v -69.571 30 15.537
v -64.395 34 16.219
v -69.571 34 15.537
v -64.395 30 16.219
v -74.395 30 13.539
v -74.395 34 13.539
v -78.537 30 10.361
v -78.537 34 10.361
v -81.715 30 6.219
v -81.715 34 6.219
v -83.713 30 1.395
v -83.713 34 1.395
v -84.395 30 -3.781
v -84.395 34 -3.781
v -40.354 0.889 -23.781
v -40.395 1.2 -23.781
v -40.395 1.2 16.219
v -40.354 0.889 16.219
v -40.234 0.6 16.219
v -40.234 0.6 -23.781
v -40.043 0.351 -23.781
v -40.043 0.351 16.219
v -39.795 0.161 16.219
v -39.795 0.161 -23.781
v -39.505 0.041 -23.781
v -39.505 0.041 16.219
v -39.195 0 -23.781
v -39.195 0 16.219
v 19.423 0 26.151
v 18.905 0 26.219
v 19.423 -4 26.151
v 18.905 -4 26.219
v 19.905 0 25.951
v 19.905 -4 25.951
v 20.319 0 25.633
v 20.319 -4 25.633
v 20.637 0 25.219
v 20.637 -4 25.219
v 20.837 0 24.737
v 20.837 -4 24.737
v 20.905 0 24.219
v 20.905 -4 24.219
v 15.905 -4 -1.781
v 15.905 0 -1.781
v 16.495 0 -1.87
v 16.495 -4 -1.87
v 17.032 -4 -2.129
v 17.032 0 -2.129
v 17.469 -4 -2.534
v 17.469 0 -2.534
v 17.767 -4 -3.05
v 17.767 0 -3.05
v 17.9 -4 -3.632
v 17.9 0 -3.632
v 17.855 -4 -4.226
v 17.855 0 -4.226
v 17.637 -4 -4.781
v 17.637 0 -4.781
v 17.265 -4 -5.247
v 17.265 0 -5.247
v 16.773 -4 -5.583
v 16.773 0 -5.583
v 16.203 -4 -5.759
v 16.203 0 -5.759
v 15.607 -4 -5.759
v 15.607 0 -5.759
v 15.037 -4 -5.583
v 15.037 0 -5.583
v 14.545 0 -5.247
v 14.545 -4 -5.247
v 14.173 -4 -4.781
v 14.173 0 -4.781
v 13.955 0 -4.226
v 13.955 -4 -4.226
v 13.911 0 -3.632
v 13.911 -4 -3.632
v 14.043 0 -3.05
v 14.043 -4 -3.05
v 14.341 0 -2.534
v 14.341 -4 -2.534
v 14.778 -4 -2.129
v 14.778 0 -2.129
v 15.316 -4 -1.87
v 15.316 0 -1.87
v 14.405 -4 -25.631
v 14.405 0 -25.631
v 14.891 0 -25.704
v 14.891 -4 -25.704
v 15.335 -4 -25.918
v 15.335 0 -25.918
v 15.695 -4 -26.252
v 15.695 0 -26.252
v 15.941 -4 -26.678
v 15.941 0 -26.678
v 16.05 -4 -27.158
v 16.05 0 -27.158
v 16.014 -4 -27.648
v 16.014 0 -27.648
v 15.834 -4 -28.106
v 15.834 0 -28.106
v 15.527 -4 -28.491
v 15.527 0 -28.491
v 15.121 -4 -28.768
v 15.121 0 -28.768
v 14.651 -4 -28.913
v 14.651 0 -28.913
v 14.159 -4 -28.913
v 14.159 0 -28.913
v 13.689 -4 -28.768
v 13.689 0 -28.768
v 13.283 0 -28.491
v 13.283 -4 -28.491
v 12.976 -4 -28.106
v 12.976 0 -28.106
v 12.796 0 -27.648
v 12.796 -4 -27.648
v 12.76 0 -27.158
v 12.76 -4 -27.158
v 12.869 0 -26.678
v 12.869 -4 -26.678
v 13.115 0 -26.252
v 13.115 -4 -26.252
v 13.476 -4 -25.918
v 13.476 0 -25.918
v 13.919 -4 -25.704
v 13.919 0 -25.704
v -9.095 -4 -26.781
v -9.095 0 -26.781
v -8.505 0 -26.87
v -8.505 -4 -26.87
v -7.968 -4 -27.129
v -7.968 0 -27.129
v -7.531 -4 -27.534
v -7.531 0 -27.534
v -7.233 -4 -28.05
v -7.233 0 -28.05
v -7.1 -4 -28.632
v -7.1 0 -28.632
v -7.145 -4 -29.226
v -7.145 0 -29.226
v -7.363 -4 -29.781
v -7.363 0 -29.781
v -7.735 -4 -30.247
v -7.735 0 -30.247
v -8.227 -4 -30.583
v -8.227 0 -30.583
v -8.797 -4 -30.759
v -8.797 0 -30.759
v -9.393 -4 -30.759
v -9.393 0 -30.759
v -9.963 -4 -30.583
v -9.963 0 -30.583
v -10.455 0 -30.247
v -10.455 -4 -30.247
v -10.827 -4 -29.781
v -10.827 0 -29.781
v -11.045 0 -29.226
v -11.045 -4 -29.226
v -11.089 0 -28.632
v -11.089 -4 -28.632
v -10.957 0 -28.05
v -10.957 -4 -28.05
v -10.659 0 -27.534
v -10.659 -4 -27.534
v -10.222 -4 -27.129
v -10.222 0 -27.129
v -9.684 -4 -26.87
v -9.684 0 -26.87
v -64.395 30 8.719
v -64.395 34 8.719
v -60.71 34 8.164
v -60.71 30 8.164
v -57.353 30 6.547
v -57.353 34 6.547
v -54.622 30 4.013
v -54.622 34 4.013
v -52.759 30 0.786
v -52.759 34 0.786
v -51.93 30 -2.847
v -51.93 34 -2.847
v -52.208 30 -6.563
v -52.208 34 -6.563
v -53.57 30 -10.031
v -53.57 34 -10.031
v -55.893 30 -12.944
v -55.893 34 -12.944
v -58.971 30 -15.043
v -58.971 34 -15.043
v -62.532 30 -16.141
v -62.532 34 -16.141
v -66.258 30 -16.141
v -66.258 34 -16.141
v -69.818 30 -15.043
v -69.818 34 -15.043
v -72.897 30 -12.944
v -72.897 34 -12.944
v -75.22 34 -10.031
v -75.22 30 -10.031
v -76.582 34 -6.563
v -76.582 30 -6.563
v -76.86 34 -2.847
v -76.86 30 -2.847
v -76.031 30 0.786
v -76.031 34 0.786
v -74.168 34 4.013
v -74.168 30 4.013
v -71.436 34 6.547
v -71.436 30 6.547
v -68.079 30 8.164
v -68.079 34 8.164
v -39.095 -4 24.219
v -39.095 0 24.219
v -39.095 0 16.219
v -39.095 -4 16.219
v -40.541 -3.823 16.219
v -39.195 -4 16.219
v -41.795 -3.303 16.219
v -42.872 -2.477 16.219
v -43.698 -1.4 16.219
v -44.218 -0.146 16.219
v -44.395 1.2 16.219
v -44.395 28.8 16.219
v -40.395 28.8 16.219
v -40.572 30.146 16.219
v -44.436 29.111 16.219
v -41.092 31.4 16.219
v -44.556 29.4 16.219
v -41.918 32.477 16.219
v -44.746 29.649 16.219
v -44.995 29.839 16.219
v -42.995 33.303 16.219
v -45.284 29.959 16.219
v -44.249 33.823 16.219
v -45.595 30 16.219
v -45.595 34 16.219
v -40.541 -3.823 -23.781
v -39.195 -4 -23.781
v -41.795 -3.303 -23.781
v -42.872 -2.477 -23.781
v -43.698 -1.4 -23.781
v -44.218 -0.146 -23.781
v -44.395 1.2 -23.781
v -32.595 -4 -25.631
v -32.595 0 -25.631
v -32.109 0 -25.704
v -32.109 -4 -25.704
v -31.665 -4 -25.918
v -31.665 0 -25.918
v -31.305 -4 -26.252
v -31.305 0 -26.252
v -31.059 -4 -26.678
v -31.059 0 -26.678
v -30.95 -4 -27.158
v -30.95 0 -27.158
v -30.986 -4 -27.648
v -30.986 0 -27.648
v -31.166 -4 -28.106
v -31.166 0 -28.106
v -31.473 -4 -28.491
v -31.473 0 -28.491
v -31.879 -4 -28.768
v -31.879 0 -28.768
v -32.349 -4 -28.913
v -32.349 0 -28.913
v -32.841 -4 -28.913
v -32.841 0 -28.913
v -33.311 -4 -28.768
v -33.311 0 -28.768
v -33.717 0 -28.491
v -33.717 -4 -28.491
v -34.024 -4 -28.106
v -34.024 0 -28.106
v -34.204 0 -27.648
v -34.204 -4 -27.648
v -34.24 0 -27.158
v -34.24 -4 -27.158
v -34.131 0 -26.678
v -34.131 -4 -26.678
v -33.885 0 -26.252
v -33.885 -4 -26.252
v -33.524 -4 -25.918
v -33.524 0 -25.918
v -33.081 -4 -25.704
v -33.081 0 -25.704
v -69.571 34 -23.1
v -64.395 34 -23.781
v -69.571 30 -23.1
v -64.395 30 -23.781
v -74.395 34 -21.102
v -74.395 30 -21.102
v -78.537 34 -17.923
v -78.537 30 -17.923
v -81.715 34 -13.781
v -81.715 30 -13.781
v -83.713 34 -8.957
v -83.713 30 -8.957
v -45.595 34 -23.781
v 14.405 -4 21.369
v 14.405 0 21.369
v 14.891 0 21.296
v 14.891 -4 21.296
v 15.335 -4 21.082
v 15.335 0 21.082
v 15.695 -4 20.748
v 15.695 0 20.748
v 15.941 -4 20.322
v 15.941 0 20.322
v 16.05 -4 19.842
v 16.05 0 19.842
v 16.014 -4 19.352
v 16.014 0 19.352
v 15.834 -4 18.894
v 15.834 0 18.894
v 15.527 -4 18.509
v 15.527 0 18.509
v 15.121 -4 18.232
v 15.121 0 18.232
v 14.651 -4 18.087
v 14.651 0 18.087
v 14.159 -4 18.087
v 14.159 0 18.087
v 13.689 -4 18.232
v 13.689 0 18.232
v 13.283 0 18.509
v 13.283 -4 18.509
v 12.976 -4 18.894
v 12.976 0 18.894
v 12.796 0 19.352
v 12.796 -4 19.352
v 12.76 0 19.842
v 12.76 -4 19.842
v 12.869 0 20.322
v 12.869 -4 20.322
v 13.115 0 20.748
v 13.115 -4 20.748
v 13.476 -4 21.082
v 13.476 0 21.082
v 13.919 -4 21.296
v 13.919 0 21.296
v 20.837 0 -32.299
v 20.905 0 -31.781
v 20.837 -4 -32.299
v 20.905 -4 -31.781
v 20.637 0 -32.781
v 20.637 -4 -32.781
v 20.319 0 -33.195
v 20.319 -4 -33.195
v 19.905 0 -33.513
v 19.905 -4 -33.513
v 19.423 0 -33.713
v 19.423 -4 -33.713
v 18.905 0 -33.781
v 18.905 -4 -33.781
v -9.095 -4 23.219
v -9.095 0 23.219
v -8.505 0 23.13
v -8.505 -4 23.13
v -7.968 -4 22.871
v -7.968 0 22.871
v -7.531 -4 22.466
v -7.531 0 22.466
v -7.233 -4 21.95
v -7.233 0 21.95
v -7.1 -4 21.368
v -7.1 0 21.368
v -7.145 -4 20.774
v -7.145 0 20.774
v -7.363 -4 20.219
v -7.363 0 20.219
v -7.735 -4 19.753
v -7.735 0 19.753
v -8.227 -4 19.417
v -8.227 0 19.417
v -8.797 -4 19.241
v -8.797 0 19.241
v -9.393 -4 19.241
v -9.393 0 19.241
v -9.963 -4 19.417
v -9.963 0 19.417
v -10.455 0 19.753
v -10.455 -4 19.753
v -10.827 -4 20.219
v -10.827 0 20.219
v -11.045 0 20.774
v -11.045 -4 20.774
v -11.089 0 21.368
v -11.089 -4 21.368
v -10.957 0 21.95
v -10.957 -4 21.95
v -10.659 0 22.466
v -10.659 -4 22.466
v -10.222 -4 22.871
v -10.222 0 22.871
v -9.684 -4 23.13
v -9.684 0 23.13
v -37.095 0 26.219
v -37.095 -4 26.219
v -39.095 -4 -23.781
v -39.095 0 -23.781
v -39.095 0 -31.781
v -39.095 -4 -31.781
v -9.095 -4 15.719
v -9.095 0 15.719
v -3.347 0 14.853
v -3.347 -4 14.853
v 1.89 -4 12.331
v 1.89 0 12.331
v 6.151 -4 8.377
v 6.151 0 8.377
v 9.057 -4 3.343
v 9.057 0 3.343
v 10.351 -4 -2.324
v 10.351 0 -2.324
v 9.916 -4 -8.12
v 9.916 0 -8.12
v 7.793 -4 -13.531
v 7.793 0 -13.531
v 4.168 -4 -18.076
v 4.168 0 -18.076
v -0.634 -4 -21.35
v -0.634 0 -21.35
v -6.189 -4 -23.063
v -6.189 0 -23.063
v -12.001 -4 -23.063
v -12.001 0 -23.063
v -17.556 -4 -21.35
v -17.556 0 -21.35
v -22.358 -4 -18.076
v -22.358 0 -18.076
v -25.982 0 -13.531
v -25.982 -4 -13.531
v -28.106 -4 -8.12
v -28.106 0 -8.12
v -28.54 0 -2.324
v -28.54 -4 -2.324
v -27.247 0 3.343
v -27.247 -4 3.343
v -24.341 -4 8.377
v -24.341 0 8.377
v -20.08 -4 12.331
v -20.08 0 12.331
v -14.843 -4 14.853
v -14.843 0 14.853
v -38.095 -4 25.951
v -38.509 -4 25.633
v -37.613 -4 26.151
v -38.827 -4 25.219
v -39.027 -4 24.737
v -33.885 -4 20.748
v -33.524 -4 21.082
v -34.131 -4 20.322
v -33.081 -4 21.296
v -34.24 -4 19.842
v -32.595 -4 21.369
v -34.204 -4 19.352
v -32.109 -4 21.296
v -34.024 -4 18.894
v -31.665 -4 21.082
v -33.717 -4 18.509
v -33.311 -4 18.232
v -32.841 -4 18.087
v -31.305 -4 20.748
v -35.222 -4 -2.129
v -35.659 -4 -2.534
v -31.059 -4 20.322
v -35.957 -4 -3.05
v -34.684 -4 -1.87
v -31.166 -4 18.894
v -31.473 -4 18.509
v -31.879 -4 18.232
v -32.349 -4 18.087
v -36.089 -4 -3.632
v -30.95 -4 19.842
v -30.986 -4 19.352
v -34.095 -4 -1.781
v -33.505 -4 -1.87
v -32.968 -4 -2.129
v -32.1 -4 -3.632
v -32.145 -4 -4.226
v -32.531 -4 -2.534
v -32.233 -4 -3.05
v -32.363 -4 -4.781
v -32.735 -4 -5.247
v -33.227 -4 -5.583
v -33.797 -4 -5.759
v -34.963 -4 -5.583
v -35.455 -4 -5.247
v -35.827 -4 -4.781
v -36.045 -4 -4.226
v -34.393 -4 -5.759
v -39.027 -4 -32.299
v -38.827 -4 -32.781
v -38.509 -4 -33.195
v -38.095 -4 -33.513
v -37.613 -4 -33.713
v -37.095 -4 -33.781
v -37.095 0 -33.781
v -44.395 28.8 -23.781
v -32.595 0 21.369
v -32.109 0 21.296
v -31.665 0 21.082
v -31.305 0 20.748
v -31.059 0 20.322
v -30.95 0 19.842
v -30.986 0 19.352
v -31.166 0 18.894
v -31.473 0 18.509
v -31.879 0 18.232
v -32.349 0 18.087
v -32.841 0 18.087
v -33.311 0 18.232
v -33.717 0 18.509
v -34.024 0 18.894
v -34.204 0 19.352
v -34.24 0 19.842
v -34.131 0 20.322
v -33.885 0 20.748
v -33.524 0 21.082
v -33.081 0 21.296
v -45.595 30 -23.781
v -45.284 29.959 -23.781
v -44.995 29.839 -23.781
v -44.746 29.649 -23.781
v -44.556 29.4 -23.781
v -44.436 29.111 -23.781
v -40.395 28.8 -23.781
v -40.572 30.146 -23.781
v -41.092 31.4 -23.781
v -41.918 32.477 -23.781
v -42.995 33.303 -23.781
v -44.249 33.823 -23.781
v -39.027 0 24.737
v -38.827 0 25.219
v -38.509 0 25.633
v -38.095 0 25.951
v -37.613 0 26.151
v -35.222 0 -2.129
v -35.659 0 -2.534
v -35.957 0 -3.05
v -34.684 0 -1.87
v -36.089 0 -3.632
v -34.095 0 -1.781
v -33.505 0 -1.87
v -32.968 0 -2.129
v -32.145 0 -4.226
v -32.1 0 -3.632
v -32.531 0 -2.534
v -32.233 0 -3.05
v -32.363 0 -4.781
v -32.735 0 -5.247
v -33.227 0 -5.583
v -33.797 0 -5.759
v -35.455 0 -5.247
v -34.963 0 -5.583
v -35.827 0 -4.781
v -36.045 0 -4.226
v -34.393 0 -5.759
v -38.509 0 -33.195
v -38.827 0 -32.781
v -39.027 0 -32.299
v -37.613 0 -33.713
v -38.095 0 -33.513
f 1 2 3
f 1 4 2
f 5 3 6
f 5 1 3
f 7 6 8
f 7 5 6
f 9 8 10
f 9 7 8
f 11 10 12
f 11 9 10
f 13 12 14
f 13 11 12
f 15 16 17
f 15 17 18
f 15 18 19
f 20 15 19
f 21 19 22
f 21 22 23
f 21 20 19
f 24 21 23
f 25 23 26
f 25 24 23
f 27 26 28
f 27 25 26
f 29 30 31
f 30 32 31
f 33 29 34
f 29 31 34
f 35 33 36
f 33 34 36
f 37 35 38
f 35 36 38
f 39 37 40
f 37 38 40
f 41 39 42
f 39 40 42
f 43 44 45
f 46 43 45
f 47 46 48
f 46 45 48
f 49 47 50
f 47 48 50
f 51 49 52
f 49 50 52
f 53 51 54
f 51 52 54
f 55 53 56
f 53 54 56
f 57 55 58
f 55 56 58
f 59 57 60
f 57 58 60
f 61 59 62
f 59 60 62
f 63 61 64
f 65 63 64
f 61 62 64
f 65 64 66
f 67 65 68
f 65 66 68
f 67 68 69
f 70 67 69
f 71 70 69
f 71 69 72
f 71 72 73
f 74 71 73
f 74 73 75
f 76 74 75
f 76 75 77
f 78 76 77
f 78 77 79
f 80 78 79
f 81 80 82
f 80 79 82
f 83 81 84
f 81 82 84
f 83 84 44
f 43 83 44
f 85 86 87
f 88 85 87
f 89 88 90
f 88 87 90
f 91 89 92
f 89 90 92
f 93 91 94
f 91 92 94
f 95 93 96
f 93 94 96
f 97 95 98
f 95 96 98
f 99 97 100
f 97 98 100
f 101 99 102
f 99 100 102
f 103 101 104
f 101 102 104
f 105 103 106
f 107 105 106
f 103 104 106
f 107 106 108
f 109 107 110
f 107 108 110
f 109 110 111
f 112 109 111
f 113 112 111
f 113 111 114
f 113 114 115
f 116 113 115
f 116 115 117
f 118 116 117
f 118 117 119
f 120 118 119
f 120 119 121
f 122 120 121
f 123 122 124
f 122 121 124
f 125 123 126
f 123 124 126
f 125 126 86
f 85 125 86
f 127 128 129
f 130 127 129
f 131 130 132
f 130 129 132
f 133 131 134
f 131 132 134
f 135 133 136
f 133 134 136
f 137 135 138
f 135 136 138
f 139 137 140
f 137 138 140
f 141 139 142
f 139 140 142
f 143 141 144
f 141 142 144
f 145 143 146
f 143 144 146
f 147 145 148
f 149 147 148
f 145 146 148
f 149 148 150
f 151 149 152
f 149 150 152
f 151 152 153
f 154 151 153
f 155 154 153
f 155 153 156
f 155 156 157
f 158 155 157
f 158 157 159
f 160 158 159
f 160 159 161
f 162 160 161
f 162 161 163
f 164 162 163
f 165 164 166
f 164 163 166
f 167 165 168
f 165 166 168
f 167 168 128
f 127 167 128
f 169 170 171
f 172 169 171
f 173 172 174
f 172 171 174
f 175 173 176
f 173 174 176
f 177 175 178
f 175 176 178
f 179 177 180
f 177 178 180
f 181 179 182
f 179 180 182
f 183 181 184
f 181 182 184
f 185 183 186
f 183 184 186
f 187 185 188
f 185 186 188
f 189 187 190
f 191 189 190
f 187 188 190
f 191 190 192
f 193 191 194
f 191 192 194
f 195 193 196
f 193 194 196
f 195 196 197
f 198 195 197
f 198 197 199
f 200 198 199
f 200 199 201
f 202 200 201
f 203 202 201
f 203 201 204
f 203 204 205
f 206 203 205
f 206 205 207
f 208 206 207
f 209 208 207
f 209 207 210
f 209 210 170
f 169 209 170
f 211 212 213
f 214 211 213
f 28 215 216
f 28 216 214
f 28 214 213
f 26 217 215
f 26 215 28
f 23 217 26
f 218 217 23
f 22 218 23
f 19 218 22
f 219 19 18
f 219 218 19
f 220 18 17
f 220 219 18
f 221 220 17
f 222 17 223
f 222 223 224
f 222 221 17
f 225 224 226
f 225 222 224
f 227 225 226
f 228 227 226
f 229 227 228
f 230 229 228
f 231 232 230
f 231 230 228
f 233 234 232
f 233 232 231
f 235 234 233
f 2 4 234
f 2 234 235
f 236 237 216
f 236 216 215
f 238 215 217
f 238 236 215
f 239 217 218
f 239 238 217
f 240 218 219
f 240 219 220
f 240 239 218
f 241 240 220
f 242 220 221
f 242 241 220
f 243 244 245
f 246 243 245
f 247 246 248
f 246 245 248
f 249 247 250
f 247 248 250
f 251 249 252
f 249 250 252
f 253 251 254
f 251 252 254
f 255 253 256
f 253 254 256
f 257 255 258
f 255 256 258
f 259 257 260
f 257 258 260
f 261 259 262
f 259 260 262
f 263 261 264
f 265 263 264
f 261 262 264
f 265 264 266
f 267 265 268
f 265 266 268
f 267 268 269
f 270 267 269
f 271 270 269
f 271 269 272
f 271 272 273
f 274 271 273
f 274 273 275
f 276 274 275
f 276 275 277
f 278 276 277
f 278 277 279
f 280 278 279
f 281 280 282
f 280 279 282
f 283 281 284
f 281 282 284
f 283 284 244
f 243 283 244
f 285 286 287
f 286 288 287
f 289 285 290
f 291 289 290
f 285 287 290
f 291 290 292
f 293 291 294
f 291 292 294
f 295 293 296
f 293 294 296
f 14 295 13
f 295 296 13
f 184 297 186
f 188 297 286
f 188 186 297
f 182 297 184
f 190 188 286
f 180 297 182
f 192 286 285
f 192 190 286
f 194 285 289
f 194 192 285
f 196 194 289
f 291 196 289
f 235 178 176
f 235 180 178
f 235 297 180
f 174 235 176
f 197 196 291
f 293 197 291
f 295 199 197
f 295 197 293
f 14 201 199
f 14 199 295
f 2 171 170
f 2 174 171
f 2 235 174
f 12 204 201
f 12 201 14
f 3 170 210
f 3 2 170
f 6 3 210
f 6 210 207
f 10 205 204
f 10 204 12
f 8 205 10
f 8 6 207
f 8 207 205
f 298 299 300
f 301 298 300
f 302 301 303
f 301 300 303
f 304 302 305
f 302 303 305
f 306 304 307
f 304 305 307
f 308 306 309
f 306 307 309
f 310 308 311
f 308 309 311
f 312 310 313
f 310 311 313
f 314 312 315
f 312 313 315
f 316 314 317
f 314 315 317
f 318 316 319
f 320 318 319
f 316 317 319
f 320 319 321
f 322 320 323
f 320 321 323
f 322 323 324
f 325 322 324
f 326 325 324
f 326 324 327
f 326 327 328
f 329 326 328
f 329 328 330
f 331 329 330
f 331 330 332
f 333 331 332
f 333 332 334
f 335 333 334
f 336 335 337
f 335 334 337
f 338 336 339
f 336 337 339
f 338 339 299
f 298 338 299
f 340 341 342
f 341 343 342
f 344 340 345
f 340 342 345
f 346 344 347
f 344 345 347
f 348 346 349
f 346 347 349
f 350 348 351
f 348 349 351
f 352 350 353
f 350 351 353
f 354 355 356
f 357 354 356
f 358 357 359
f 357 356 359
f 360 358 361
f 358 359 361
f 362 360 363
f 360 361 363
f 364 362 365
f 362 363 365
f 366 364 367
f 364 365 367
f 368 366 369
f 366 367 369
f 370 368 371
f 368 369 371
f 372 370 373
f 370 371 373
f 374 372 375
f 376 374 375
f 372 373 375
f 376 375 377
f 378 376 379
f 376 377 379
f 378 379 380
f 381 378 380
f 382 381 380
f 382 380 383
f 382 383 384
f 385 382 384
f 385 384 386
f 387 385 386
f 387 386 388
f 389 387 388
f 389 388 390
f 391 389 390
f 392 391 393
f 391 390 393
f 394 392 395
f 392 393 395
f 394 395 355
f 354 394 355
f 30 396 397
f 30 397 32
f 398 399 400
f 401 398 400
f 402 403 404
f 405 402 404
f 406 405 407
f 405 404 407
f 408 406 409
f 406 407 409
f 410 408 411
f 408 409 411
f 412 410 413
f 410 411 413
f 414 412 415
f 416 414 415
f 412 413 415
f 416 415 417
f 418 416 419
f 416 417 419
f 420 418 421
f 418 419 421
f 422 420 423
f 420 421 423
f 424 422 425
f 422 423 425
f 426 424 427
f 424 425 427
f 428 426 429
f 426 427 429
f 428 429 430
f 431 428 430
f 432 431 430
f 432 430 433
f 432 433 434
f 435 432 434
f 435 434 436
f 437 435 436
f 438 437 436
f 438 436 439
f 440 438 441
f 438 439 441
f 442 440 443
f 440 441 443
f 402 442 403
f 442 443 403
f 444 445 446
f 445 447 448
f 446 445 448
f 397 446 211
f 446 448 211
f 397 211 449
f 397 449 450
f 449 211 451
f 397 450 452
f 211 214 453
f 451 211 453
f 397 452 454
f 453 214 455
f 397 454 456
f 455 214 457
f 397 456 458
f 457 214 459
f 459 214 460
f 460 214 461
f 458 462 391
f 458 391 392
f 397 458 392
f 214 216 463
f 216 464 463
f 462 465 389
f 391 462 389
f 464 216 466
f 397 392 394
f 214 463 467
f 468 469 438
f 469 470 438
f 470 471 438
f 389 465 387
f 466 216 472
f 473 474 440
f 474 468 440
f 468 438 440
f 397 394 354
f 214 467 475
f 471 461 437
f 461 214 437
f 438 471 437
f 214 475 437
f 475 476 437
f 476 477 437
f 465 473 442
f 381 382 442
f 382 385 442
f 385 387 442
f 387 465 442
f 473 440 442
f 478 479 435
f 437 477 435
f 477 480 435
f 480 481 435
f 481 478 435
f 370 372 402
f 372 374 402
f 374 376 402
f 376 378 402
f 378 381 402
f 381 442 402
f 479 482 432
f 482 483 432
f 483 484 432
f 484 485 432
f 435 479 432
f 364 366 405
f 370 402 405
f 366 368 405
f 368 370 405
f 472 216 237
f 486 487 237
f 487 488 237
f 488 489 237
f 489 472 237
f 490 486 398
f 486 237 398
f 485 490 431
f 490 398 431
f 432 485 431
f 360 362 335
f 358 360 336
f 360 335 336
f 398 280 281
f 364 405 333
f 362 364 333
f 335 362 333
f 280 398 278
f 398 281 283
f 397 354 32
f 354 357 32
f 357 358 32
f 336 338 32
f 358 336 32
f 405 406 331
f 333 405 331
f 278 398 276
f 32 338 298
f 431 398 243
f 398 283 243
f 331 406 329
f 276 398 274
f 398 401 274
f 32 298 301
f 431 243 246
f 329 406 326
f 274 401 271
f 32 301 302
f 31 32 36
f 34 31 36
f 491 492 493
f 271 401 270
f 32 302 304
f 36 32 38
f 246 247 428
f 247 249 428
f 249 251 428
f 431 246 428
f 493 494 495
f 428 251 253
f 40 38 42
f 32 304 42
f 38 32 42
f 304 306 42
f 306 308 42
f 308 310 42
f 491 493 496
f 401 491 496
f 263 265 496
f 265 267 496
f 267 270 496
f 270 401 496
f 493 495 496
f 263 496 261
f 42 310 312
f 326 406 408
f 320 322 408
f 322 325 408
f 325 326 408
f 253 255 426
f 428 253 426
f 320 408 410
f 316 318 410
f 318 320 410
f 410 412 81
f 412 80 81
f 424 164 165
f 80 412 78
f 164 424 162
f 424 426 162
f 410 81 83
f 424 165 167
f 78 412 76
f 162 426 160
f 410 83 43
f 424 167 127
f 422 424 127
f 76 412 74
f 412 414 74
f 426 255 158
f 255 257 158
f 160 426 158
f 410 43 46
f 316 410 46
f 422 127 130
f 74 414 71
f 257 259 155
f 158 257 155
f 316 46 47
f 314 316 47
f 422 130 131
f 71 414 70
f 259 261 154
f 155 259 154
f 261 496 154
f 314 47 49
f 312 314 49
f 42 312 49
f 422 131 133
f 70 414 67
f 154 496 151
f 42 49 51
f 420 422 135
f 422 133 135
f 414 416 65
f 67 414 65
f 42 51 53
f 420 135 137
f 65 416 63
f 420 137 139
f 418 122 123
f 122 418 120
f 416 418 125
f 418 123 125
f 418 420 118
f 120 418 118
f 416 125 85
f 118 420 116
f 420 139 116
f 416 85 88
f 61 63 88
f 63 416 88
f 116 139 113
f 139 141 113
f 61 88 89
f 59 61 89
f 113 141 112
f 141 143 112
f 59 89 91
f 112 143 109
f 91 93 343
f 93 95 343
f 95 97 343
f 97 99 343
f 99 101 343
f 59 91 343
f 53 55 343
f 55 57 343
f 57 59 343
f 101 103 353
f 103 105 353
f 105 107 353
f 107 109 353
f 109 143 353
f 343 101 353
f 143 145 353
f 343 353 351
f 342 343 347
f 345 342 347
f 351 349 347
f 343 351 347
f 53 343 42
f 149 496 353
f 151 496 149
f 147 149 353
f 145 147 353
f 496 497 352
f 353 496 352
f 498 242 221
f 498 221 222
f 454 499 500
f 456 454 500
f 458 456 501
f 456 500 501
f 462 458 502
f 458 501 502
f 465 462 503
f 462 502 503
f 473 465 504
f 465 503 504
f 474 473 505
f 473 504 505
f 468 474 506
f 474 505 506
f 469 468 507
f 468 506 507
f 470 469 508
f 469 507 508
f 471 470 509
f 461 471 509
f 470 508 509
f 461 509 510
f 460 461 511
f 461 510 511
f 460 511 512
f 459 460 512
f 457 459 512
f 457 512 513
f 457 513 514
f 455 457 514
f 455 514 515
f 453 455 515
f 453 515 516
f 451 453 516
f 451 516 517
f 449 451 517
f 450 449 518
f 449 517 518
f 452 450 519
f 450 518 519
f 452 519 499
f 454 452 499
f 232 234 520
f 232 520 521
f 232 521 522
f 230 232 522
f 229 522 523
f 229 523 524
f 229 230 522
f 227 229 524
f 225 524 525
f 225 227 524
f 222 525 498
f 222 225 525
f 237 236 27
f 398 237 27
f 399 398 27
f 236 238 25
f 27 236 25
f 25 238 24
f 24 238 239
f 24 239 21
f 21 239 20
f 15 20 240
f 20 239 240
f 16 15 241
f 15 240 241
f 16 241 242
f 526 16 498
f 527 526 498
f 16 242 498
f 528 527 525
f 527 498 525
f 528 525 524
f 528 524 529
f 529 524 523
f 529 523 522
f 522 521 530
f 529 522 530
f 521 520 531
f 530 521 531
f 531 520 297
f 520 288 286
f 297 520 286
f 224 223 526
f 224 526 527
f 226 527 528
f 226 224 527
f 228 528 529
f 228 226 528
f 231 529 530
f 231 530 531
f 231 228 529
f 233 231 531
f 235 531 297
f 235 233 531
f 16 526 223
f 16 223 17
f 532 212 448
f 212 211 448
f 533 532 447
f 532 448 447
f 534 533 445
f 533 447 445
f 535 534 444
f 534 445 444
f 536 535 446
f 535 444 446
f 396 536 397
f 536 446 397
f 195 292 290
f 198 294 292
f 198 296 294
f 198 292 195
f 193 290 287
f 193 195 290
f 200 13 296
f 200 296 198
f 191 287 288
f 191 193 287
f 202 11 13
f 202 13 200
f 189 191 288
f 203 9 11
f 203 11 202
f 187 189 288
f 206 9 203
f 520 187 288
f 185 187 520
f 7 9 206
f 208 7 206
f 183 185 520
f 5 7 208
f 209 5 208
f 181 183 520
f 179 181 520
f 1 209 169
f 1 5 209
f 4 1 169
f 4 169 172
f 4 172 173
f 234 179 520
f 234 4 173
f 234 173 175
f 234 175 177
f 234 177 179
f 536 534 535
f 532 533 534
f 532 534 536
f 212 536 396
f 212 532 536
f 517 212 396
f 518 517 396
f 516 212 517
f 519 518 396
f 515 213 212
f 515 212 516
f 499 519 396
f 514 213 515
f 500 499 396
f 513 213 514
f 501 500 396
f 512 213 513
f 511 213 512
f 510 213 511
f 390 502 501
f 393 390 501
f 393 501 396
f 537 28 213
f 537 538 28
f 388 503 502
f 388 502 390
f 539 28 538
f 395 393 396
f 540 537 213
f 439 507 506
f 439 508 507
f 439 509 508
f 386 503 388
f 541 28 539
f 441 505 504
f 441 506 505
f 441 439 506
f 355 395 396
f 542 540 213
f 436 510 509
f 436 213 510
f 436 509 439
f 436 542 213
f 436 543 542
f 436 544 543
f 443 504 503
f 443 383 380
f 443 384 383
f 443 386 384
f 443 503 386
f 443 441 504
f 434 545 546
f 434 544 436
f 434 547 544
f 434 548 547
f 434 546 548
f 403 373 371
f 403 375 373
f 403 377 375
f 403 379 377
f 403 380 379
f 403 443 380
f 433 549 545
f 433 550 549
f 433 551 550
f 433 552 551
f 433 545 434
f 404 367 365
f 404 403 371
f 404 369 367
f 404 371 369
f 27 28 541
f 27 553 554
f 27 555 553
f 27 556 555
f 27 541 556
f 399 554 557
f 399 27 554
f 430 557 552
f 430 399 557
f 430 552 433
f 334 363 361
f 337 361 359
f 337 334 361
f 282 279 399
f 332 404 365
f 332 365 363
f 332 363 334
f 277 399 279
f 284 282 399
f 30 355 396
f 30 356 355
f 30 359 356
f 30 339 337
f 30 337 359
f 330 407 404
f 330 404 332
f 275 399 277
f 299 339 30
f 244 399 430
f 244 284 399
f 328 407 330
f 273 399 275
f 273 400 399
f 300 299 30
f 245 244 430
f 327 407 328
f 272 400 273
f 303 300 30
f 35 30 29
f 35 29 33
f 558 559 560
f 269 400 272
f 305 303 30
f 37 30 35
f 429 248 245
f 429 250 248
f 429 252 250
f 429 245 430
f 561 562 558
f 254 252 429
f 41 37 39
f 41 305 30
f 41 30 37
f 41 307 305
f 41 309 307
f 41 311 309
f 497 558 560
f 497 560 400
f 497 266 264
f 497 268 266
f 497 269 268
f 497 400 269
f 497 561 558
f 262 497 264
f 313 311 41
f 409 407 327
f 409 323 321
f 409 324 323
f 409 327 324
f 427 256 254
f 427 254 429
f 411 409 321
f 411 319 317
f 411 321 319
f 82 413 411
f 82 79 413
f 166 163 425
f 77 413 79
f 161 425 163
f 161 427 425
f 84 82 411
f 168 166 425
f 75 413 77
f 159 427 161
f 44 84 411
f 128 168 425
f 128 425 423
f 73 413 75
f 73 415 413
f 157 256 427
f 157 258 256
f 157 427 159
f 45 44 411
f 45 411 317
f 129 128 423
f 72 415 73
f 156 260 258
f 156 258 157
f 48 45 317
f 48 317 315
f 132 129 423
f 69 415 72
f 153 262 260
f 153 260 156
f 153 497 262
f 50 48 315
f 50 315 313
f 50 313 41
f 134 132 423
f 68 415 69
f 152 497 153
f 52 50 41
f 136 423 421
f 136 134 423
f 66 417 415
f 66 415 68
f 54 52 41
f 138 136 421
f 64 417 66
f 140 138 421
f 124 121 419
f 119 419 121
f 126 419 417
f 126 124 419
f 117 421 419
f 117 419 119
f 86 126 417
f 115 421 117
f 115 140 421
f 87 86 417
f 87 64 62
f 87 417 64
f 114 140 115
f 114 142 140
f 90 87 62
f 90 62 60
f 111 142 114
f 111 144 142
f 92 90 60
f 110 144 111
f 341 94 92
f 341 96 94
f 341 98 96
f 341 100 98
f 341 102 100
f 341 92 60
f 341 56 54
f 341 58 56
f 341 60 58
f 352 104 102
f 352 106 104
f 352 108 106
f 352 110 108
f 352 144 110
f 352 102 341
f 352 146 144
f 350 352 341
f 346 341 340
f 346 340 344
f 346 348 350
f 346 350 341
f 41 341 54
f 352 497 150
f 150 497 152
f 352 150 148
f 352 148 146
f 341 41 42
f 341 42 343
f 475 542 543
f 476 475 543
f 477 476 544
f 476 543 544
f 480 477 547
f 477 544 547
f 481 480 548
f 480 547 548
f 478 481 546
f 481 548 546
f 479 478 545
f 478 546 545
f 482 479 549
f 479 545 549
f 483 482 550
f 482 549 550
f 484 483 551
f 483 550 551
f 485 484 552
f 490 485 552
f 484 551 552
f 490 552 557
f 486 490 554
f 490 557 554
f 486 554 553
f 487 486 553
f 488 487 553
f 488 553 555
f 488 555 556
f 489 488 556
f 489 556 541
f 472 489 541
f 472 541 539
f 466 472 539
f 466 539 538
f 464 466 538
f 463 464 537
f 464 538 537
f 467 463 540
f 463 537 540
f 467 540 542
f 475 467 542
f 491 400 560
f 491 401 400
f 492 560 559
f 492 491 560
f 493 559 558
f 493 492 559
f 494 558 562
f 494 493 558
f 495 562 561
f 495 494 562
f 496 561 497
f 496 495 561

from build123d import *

# Parameters (mm, degrees)
SKETCH_1_W                       = 60
SKETCH_1_H                       = 60
SKETCH_1_R                       = 1.65
SKETCH_1_R_2                     = 19.5
SKETCH_1_R_3                     = 2
SM_BASE_FLANGE_1_DEPTH           = 4
SKETCH_4_W                       = 40
SKETCH_4_H                       = 4
EXTRUDE_1_DEPTH                  = 0.1
SM_EDGE_FLANGE_1_DEPTH           = 40
SM_EDGE_FLANGE_2_STRIP_W         = 18.4
SM_EDGE_FLANGE_2_STRIP_H         = 4
SM_EDGE_FLANGE_2_STRIP_CUT_DEPTH = 40
SM_EDGE_FLANGE_2_DEPTH           = 40
FILLET_1_R                       = 2
SKETCH_11_R                      = 12.5
CUT_EXTRUDE_1_DEPTH              = 10
FILLET_2_R                       = 20


# Sheet-metal steps are written as plain solids
with BuildPart() as part:
    # Sketch 1 → Базовая кромка1 (new body)
    with BuildSketch(Plane(origin=(0, 0, 0), x_dir=(1, 0, 0), z_dir=(0, 1, 0))):
        with Locations((-9.094903125, 3.781032797)):
            Rectangle(SKETCH_1_W, SKETCH_1_H)
        with Locations(Location((-32.594903125, 27.281032797, 0), (0, 0, 270))):
            Circle(SKETCH_1_R, mode=Mode.SUBTRACT)
        with Locations(Location((14.405096875, 27.281032797, 0), (0, 0, 270))):
            Circle(SKETCH_1_R, mode=Mode.SUBTRACT)
        with Locations(Location((-32.594903125, -19.718967203, 0), (0, 0, 270))):
            Circle(SKETCH_1_R, mode=Mode.SUBTRACT)
        with Locations(Location((14.405096875, -19.718967203, 0), (0, 0, 270))):
            Circle(SKETCH_1_R, mode=Mode.SUBTRACT)
        with Locations(Location((-9.094903125, 3.781032797, 0), (0, 0, 270))):
            Circle(SKETCH_1_R_2, mode=Mode.SUBTRACT)
        with Locations(Location((-34.094903125, 3.781032797, 0), (0, 0, 270))):
            Circle(SKETCH_1_R_3, mode=Mode.SUBTRACT)
        with Locations(Location((15.905096875, 3.781032797, 0), (0, 0, 270))):
            Circle(SKETCH_1_R_3, mode=Mode.SUBTRACT)
        with Locations(Location((-9.094903125, 28.781032797, 0), (0, 0, 270))):
            Circle(SKETCH_1_R_3, mode=Mode.SUBTRACT)
        with Locations(Location((-9.094903125, -21.218967203, 0), (0, 0, 270))):
            Circle(SKETCH_1_R_3, mode=Mode.SUBTRACT)
    extrude(amount=-SM_BASE_FLANGE_1_DEPTH)

    # Эскиз4 → Бобышка-Вытянуть1 (add)
    with BuildSketch(Plane.ZY.offset(39.094903125)):
        with Locations((-3.781032797, -2)):
            Rectangle(SKETCH_4_W, SKETCH_4_H)
    extrude(amount=EXTRUDE_1_DEPTH)

    # Ребро-кромка1 section (across the edge) → Ребро-кромка1 (add)
    with BuildSketch(Plane(origin=(-40.394903125, 0, -23.781032797), x_dir=(1, 0, 0), z_dir=(0, 0, 1))):
        with BuildLine():
            Line((-4, 1.2), (-4, 30))
            Line((-4, 30), (0, 30))
            Line((0, 30), (0, 1.2))
            ThreePointArc((0, 1.2), (0.351471863, 0.351471863), (1.2, 0))
            Line((1.2, 0), (1.2, -4))
            ThreePointArc((1.2, -4), (-2.476955262, -2.476955262), (-4, 1.2))
        make_face()
    extrude(amount=SM_EDGE_FLANGE_1_DEPTH)

    # Ребро-кромка2 strip (across the edge) → Ребро-кромка2 strip cut (cut)
    with BuildSketch(Plane(origin=(-44.394903125, 30, 16.218967203), x_dir=(0, -1, 0), z_dir=(0, 0, -1))):
        with Locations((-8, -2)):
            Rectangle(SM_EDGE_FLANGE_2_STRIP_W, SM_EDGE_FLANGE_2_STRIP_H)
    extrude(amount=SM_EDGE_FLANGE_2_STRIP_CUT_DEPTH, mode=Mode.SUBTRACT)

    # Ребро-кромка2 section (across the edge) → Ребро-кромка2 (add)
    with BuildSketch(Plane(origin=(-44.394903125, 30, 16.218967203), x_dir=(0, -1, 0), z_dir=(0, 0, -1))):
        with BuildLine():
            Line((-4, 1.2), (-4, 40))
            Line((-4, 40), (0, 40))
            Line((0, 40), (0, 1.2))
            ThreePointArc((0, 1.2), (0.351471863, 0.351471863), (1.2, 0))
            Line((1.2, 0), (1.2, -4))
            ThreePointArc((1.2, -4), (-2.476955262, -2.476955262), (-4, 1.2))
        make_face()
    extrude(amount=SM_EDGE_FLANGE_2_DEPTH)

    # Скругление1
    fillet_1_edges = [part.edges().sort_by_distance(p)[0] for p in [
        (-39.094903125, -2, -33.781032797),
        (20.905096875, -2, -33.781032797),
        (20.905096875, -2, 26.218967203),
        (-39.094903125, -2, 26.218967203),
    ]]
    fillet(fillet_1_edges, radius=FILLET_1_R)

    # Эскиз11 → Вырез-Вытянуть1 (cut)
    with BuildSketch(Plane(origin=(0, 34, 0), x_dir=(1, 0, 0), z_dir=(0, 1, 0))):
        with Locations(Location((-64.394903125, 3.781032797, 0), (0, 0, 270))):
            Circle(SKETCH_11_R)
    extrude(amount=-CUT_EXTRUDE_1_DEPTH, mode=Mode.SUBTRACT)

    # Скругление2
    fillet_2_edges = [part.edges().sort_by_distance(p)[0] for p in [
        (-84.394903125, 32, -23.781032797),
        (-84.394903125, 32, 16.218967203),
    ]]
    fillet(fillet_2_edges, radius=FILLET_2_R - 0.0001)  # a hair under: the kernel refuses the full size


solid = part.part
